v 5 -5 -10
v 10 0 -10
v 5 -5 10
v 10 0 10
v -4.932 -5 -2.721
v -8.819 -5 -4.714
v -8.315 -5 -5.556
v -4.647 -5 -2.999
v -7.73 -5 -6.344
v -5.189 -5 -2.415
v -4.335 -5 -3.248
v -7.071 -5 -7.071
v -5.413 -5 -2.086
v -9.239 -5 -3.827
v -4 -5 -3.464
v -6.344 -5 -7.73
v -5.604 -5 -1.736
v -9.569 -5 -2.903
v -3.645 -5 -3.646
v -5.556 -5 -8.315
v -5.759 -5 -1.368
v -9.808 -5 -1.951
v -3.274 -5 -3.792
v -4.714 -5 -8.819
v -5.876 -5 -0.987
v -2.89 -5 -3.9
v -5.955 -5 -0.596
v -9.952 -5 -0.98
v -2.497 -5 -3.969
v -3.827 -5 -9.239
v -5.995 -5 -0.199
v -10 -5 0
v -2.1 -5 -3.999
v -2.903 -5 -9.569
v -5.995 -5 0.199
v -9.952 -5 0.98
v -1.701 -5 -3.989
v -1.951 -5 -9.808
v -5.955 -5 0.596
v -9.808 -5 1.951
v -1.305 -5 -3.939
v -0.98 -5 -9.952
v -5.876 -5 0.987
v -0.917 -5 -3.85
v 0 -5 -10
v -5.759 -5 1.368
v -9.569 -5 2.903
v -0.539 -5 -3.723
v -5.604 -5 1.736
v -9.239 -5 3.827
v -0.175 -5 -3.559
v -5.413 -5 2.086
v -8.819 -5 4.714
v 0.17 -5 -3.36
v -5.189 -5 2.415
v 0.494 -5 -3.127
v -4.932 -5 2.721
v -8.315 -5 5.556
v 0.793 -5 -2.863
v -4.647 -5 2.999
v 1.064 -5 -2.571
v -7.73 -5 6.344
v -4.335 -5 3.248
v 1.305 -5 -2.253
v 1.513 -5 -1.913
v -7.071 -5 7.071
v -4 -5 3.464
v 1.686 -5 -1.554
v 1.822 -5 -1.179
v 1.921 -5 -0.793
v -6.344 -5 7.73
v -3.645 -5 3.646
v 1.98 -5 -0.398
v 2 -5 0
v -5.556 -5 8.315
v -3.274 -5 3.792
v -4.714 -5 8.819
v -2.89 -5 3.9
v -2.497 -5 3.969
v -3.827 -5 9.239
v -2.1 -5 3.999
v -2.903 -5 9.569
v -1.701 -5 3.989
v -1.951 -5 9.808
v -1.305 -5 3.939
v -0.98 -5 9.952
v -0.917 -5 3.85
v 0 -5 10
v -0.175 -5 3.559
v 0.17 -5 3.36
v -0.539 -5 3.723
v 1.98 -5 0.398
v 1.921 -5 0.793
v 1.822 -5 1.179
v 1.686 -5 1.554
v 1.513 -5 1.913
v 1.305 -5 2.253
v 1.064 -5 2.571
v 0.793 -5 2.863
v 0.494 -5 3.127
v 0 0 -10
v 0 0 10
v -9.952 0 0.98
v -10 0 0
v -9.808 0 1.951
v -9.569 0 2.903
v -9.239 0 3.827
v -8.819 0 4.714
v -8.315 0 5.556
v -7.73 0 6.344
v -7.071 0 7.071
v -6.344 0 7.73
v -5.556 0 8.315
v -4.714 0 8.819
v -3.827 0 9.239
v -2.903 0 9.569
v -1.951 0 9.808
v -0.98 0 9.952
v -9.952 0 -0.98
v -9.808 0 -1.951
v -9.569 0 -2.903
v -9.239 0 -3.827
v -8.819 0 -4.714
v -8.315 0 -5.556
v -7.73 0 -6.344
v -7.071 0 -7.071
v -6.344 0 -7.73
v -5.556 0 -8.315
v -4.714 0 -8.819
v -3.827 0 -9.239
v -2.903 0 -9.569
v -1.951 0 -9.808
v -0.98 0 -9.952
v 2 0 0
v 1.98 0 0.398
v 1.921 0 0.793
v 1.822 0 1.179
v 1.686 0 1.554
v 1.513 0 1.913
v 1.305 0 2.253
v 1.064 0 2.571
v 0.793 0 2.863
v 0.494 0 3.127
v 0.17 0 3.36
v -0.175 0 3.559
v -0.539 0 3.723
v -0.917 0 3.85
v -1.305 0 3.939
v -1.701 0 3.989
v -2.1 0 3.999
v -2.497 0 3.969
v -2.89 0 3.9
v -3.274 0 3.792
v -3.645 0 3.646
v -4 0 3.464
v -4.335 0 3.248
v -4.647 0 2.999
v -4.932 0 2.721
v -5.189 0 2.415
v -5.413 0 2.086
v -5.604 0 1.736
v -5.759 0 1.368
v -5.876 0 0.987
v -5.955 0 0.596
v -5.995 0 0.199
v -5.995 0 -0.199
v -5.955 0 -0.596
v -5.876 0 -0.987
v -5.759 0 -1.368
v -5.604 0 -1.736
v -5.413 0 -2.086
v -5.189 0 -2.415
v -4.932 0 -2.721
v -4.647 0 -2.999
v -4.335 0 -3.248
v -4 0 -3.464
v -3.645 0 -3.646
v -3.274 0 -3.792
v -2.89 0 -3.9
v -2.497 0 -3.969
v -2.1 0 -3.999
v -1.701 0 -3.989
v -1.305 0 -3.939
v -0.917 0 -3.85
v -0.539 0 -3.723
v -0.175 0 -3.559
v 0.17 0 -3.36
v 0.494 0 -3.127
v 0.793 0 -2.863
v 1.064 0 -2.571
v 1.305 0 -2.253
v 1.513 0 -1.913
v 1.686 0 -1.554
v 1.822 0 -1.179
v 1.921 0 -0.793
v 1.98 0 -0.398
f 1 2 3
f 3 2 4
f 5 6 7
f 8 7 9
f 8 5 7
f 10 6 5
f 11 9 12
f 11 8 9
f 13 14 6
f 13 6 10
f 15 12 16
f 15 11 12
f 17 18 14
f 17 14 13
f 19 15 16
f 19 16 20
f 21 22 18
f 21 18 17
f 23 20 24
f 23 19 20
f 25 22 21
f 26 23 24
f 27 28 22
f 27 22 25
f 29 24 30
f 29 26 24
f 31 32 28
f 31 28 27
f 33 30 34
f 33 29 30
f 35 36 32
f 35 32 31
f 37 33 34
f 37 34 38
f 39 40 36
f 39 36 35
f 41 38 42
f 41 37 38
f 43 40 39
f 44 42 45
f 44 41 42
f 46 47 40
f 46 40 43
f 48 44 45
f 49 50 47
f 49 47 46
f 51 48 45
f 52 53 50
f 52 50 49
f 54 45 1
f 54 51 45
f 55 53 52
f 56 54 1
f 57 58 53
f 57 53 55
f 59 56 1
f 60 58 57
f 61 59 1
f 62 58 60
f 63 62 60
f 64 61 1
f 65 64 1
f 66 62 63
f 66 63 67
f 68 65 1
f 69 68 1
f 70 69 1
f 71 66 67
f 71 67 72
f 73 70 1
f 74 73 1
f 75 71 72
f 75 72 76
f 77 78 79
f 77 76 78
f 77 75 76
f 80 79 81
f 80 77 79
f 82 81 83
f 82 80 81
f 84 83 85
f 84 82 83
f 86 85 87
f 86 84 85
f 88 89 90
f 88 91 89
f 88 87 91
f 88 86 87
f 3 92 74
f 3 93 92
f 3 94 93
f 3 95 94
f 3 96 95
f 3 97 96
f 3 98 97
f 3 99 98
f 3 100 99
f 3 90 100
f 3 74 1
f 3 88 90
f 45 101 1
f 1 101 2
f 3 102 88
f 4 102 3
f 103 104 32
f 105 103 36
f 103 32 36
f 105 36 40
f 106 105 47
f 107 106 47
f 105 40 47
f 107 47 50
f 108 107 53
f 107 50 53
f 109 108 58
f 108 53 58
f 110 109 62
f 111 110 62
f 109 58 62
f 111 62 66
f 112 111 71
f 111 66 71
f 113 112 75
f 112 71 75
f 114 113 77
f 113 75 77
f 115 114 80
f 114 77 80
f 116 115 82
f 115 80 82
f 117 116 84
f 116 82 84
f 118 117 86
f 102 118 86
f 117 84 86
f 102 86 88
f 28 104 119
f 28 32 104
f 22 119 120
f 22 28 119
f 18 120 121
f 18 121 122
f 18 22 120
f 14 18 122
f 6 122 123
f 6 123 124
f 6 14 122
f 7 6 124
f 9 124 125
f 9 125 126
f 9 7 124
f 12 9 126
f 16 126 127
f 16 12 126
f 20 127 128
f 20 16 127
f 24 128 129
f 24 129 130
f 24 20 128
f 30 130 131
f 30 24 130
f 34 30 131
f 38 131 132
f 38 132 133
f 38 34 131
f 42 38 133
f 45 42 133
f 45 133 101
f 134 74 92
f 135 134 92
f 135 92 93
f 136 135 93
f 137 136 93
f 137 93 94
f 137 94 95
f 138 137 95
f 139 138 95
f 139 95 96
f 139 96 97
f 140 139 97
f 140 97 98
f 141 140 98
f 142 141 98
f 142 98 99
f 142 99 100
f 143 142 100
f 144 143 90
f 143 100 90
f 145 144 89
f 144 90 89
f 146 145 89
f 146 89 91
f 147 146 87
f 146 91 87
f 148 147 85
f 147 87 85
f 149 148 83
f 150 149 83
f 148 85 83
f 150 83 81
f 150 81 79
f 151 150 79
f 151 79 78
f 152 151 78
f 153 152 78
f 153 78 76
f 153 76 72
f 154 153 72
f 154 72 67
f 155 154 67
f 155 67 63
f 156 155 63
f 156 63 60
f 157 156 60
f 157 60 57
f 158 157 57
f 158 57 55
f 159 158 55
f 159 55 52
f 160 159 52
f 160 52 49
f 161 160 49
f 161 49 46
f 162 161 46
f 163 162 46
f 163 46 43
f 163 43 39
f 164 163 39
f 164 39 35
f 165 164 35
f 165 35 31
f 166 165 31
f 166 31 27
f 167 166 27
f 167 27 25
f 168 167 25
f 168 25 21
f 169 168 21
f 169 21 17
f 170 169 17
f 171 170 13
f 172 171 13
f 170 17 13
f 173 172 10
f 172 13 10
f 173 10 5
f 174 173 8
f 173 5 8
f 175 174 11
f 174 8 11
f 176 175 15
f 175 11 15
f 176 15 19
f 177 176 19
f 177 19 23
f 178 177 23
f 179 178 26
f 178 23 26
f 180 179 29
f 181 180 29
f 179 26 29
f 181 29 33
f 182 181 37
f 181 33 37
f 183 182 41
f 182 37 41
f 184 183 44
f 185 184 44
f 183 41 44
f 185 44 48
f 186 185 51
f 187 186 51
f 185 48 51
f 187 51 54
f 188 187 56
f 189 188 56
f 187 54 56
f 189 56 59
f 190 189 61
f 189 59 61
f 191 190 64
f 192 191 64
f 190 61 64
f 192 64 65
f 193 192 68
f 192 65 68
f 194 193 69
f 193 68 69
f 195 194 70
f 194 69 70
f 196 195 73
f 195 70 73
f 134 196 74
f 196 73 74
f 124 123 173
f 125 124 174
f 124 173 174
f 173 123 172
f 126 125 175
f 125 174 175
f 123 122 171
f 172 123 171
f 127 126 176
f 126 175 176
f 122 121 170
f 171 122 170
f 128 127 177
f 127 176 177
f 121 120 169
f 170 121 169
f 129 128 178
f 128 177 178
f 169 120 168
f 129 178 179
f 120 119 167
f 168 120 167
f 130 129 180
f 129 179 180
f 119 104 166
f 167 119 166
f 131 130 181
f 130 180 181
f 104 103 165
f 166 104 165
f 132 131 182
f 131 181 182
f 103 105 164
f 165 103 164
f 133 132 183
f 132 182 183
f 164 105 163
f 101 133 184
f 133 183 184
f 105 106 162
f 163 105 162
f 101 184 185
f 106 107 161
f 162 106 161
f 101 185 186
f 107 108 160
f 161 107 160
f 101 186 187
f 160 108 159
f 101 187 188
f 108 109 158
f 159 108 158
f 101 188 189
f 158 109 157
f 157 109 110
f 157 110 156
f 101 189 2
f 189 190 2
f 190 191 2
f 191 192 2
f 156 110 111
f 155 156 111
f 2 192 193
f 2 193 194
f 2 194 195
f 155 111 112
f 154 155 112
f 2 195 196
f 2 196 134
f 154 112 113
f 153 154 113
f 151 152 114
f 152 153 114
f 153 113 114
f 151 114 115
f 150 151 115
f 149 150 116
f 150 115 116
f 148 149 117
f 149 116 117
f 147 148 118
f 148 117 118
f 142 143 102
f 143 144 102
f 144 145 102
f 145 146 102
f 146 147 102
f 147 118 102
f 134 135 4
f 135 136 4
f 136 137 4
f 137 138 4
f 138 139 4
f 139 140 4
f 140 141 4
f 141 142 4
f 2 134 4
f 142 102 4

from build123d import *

# Parameters (mm, degrees)
F0_W     = 20
F0_H     = 20
F1_DEPTH = 5
F2_R     = 9.99999
F3_R     = 4
F4_DEPTH = 25
F5_SIZE  = 4.99999


# Not quite as in the source:
# - a fillet or chamfer is up to 0.001 mm smaller than in the source, because OpenCascade refuses the exact size


with BuildPart() as f1:
    # F0 (on Front) → F1 (new body)
    with BuildSketch(Plane.XZ):
        Rectangle(F0_W, F0_H)
    extrude(amount=F1_DEPTH)

    # F2 (radius 10 in the source; OpenCascade refuses exactly that, so slightly less here)
    f2_edges = [f1.edges().sort_by_distance(p)[0] for p in [
        (-10, -2.5, 10),
        (-10, -2.5, -10),
    ]]
    fillet(f2_edges, radius=F2_R)

    # F3 (on face) → F4 (cut)
    with BuildSketch(Plane.XZ.offset(5)):
        with Locations((-2, 0)):
            Circle(F3_R)
    extrude(amount=-F4_DEPTH, mode=Mode.SUBTRACT)

    # F5 (size 5 in the source; OpenCascade refuses exactly that, so slightly less here)
    f5_edges = [f1.edges().sort_by_distance(p)[0] for p in [
        (10, -5, 0),
    ]]
    chamfer(f5_edges, length=F5_SIZE)


solid = f1.part
